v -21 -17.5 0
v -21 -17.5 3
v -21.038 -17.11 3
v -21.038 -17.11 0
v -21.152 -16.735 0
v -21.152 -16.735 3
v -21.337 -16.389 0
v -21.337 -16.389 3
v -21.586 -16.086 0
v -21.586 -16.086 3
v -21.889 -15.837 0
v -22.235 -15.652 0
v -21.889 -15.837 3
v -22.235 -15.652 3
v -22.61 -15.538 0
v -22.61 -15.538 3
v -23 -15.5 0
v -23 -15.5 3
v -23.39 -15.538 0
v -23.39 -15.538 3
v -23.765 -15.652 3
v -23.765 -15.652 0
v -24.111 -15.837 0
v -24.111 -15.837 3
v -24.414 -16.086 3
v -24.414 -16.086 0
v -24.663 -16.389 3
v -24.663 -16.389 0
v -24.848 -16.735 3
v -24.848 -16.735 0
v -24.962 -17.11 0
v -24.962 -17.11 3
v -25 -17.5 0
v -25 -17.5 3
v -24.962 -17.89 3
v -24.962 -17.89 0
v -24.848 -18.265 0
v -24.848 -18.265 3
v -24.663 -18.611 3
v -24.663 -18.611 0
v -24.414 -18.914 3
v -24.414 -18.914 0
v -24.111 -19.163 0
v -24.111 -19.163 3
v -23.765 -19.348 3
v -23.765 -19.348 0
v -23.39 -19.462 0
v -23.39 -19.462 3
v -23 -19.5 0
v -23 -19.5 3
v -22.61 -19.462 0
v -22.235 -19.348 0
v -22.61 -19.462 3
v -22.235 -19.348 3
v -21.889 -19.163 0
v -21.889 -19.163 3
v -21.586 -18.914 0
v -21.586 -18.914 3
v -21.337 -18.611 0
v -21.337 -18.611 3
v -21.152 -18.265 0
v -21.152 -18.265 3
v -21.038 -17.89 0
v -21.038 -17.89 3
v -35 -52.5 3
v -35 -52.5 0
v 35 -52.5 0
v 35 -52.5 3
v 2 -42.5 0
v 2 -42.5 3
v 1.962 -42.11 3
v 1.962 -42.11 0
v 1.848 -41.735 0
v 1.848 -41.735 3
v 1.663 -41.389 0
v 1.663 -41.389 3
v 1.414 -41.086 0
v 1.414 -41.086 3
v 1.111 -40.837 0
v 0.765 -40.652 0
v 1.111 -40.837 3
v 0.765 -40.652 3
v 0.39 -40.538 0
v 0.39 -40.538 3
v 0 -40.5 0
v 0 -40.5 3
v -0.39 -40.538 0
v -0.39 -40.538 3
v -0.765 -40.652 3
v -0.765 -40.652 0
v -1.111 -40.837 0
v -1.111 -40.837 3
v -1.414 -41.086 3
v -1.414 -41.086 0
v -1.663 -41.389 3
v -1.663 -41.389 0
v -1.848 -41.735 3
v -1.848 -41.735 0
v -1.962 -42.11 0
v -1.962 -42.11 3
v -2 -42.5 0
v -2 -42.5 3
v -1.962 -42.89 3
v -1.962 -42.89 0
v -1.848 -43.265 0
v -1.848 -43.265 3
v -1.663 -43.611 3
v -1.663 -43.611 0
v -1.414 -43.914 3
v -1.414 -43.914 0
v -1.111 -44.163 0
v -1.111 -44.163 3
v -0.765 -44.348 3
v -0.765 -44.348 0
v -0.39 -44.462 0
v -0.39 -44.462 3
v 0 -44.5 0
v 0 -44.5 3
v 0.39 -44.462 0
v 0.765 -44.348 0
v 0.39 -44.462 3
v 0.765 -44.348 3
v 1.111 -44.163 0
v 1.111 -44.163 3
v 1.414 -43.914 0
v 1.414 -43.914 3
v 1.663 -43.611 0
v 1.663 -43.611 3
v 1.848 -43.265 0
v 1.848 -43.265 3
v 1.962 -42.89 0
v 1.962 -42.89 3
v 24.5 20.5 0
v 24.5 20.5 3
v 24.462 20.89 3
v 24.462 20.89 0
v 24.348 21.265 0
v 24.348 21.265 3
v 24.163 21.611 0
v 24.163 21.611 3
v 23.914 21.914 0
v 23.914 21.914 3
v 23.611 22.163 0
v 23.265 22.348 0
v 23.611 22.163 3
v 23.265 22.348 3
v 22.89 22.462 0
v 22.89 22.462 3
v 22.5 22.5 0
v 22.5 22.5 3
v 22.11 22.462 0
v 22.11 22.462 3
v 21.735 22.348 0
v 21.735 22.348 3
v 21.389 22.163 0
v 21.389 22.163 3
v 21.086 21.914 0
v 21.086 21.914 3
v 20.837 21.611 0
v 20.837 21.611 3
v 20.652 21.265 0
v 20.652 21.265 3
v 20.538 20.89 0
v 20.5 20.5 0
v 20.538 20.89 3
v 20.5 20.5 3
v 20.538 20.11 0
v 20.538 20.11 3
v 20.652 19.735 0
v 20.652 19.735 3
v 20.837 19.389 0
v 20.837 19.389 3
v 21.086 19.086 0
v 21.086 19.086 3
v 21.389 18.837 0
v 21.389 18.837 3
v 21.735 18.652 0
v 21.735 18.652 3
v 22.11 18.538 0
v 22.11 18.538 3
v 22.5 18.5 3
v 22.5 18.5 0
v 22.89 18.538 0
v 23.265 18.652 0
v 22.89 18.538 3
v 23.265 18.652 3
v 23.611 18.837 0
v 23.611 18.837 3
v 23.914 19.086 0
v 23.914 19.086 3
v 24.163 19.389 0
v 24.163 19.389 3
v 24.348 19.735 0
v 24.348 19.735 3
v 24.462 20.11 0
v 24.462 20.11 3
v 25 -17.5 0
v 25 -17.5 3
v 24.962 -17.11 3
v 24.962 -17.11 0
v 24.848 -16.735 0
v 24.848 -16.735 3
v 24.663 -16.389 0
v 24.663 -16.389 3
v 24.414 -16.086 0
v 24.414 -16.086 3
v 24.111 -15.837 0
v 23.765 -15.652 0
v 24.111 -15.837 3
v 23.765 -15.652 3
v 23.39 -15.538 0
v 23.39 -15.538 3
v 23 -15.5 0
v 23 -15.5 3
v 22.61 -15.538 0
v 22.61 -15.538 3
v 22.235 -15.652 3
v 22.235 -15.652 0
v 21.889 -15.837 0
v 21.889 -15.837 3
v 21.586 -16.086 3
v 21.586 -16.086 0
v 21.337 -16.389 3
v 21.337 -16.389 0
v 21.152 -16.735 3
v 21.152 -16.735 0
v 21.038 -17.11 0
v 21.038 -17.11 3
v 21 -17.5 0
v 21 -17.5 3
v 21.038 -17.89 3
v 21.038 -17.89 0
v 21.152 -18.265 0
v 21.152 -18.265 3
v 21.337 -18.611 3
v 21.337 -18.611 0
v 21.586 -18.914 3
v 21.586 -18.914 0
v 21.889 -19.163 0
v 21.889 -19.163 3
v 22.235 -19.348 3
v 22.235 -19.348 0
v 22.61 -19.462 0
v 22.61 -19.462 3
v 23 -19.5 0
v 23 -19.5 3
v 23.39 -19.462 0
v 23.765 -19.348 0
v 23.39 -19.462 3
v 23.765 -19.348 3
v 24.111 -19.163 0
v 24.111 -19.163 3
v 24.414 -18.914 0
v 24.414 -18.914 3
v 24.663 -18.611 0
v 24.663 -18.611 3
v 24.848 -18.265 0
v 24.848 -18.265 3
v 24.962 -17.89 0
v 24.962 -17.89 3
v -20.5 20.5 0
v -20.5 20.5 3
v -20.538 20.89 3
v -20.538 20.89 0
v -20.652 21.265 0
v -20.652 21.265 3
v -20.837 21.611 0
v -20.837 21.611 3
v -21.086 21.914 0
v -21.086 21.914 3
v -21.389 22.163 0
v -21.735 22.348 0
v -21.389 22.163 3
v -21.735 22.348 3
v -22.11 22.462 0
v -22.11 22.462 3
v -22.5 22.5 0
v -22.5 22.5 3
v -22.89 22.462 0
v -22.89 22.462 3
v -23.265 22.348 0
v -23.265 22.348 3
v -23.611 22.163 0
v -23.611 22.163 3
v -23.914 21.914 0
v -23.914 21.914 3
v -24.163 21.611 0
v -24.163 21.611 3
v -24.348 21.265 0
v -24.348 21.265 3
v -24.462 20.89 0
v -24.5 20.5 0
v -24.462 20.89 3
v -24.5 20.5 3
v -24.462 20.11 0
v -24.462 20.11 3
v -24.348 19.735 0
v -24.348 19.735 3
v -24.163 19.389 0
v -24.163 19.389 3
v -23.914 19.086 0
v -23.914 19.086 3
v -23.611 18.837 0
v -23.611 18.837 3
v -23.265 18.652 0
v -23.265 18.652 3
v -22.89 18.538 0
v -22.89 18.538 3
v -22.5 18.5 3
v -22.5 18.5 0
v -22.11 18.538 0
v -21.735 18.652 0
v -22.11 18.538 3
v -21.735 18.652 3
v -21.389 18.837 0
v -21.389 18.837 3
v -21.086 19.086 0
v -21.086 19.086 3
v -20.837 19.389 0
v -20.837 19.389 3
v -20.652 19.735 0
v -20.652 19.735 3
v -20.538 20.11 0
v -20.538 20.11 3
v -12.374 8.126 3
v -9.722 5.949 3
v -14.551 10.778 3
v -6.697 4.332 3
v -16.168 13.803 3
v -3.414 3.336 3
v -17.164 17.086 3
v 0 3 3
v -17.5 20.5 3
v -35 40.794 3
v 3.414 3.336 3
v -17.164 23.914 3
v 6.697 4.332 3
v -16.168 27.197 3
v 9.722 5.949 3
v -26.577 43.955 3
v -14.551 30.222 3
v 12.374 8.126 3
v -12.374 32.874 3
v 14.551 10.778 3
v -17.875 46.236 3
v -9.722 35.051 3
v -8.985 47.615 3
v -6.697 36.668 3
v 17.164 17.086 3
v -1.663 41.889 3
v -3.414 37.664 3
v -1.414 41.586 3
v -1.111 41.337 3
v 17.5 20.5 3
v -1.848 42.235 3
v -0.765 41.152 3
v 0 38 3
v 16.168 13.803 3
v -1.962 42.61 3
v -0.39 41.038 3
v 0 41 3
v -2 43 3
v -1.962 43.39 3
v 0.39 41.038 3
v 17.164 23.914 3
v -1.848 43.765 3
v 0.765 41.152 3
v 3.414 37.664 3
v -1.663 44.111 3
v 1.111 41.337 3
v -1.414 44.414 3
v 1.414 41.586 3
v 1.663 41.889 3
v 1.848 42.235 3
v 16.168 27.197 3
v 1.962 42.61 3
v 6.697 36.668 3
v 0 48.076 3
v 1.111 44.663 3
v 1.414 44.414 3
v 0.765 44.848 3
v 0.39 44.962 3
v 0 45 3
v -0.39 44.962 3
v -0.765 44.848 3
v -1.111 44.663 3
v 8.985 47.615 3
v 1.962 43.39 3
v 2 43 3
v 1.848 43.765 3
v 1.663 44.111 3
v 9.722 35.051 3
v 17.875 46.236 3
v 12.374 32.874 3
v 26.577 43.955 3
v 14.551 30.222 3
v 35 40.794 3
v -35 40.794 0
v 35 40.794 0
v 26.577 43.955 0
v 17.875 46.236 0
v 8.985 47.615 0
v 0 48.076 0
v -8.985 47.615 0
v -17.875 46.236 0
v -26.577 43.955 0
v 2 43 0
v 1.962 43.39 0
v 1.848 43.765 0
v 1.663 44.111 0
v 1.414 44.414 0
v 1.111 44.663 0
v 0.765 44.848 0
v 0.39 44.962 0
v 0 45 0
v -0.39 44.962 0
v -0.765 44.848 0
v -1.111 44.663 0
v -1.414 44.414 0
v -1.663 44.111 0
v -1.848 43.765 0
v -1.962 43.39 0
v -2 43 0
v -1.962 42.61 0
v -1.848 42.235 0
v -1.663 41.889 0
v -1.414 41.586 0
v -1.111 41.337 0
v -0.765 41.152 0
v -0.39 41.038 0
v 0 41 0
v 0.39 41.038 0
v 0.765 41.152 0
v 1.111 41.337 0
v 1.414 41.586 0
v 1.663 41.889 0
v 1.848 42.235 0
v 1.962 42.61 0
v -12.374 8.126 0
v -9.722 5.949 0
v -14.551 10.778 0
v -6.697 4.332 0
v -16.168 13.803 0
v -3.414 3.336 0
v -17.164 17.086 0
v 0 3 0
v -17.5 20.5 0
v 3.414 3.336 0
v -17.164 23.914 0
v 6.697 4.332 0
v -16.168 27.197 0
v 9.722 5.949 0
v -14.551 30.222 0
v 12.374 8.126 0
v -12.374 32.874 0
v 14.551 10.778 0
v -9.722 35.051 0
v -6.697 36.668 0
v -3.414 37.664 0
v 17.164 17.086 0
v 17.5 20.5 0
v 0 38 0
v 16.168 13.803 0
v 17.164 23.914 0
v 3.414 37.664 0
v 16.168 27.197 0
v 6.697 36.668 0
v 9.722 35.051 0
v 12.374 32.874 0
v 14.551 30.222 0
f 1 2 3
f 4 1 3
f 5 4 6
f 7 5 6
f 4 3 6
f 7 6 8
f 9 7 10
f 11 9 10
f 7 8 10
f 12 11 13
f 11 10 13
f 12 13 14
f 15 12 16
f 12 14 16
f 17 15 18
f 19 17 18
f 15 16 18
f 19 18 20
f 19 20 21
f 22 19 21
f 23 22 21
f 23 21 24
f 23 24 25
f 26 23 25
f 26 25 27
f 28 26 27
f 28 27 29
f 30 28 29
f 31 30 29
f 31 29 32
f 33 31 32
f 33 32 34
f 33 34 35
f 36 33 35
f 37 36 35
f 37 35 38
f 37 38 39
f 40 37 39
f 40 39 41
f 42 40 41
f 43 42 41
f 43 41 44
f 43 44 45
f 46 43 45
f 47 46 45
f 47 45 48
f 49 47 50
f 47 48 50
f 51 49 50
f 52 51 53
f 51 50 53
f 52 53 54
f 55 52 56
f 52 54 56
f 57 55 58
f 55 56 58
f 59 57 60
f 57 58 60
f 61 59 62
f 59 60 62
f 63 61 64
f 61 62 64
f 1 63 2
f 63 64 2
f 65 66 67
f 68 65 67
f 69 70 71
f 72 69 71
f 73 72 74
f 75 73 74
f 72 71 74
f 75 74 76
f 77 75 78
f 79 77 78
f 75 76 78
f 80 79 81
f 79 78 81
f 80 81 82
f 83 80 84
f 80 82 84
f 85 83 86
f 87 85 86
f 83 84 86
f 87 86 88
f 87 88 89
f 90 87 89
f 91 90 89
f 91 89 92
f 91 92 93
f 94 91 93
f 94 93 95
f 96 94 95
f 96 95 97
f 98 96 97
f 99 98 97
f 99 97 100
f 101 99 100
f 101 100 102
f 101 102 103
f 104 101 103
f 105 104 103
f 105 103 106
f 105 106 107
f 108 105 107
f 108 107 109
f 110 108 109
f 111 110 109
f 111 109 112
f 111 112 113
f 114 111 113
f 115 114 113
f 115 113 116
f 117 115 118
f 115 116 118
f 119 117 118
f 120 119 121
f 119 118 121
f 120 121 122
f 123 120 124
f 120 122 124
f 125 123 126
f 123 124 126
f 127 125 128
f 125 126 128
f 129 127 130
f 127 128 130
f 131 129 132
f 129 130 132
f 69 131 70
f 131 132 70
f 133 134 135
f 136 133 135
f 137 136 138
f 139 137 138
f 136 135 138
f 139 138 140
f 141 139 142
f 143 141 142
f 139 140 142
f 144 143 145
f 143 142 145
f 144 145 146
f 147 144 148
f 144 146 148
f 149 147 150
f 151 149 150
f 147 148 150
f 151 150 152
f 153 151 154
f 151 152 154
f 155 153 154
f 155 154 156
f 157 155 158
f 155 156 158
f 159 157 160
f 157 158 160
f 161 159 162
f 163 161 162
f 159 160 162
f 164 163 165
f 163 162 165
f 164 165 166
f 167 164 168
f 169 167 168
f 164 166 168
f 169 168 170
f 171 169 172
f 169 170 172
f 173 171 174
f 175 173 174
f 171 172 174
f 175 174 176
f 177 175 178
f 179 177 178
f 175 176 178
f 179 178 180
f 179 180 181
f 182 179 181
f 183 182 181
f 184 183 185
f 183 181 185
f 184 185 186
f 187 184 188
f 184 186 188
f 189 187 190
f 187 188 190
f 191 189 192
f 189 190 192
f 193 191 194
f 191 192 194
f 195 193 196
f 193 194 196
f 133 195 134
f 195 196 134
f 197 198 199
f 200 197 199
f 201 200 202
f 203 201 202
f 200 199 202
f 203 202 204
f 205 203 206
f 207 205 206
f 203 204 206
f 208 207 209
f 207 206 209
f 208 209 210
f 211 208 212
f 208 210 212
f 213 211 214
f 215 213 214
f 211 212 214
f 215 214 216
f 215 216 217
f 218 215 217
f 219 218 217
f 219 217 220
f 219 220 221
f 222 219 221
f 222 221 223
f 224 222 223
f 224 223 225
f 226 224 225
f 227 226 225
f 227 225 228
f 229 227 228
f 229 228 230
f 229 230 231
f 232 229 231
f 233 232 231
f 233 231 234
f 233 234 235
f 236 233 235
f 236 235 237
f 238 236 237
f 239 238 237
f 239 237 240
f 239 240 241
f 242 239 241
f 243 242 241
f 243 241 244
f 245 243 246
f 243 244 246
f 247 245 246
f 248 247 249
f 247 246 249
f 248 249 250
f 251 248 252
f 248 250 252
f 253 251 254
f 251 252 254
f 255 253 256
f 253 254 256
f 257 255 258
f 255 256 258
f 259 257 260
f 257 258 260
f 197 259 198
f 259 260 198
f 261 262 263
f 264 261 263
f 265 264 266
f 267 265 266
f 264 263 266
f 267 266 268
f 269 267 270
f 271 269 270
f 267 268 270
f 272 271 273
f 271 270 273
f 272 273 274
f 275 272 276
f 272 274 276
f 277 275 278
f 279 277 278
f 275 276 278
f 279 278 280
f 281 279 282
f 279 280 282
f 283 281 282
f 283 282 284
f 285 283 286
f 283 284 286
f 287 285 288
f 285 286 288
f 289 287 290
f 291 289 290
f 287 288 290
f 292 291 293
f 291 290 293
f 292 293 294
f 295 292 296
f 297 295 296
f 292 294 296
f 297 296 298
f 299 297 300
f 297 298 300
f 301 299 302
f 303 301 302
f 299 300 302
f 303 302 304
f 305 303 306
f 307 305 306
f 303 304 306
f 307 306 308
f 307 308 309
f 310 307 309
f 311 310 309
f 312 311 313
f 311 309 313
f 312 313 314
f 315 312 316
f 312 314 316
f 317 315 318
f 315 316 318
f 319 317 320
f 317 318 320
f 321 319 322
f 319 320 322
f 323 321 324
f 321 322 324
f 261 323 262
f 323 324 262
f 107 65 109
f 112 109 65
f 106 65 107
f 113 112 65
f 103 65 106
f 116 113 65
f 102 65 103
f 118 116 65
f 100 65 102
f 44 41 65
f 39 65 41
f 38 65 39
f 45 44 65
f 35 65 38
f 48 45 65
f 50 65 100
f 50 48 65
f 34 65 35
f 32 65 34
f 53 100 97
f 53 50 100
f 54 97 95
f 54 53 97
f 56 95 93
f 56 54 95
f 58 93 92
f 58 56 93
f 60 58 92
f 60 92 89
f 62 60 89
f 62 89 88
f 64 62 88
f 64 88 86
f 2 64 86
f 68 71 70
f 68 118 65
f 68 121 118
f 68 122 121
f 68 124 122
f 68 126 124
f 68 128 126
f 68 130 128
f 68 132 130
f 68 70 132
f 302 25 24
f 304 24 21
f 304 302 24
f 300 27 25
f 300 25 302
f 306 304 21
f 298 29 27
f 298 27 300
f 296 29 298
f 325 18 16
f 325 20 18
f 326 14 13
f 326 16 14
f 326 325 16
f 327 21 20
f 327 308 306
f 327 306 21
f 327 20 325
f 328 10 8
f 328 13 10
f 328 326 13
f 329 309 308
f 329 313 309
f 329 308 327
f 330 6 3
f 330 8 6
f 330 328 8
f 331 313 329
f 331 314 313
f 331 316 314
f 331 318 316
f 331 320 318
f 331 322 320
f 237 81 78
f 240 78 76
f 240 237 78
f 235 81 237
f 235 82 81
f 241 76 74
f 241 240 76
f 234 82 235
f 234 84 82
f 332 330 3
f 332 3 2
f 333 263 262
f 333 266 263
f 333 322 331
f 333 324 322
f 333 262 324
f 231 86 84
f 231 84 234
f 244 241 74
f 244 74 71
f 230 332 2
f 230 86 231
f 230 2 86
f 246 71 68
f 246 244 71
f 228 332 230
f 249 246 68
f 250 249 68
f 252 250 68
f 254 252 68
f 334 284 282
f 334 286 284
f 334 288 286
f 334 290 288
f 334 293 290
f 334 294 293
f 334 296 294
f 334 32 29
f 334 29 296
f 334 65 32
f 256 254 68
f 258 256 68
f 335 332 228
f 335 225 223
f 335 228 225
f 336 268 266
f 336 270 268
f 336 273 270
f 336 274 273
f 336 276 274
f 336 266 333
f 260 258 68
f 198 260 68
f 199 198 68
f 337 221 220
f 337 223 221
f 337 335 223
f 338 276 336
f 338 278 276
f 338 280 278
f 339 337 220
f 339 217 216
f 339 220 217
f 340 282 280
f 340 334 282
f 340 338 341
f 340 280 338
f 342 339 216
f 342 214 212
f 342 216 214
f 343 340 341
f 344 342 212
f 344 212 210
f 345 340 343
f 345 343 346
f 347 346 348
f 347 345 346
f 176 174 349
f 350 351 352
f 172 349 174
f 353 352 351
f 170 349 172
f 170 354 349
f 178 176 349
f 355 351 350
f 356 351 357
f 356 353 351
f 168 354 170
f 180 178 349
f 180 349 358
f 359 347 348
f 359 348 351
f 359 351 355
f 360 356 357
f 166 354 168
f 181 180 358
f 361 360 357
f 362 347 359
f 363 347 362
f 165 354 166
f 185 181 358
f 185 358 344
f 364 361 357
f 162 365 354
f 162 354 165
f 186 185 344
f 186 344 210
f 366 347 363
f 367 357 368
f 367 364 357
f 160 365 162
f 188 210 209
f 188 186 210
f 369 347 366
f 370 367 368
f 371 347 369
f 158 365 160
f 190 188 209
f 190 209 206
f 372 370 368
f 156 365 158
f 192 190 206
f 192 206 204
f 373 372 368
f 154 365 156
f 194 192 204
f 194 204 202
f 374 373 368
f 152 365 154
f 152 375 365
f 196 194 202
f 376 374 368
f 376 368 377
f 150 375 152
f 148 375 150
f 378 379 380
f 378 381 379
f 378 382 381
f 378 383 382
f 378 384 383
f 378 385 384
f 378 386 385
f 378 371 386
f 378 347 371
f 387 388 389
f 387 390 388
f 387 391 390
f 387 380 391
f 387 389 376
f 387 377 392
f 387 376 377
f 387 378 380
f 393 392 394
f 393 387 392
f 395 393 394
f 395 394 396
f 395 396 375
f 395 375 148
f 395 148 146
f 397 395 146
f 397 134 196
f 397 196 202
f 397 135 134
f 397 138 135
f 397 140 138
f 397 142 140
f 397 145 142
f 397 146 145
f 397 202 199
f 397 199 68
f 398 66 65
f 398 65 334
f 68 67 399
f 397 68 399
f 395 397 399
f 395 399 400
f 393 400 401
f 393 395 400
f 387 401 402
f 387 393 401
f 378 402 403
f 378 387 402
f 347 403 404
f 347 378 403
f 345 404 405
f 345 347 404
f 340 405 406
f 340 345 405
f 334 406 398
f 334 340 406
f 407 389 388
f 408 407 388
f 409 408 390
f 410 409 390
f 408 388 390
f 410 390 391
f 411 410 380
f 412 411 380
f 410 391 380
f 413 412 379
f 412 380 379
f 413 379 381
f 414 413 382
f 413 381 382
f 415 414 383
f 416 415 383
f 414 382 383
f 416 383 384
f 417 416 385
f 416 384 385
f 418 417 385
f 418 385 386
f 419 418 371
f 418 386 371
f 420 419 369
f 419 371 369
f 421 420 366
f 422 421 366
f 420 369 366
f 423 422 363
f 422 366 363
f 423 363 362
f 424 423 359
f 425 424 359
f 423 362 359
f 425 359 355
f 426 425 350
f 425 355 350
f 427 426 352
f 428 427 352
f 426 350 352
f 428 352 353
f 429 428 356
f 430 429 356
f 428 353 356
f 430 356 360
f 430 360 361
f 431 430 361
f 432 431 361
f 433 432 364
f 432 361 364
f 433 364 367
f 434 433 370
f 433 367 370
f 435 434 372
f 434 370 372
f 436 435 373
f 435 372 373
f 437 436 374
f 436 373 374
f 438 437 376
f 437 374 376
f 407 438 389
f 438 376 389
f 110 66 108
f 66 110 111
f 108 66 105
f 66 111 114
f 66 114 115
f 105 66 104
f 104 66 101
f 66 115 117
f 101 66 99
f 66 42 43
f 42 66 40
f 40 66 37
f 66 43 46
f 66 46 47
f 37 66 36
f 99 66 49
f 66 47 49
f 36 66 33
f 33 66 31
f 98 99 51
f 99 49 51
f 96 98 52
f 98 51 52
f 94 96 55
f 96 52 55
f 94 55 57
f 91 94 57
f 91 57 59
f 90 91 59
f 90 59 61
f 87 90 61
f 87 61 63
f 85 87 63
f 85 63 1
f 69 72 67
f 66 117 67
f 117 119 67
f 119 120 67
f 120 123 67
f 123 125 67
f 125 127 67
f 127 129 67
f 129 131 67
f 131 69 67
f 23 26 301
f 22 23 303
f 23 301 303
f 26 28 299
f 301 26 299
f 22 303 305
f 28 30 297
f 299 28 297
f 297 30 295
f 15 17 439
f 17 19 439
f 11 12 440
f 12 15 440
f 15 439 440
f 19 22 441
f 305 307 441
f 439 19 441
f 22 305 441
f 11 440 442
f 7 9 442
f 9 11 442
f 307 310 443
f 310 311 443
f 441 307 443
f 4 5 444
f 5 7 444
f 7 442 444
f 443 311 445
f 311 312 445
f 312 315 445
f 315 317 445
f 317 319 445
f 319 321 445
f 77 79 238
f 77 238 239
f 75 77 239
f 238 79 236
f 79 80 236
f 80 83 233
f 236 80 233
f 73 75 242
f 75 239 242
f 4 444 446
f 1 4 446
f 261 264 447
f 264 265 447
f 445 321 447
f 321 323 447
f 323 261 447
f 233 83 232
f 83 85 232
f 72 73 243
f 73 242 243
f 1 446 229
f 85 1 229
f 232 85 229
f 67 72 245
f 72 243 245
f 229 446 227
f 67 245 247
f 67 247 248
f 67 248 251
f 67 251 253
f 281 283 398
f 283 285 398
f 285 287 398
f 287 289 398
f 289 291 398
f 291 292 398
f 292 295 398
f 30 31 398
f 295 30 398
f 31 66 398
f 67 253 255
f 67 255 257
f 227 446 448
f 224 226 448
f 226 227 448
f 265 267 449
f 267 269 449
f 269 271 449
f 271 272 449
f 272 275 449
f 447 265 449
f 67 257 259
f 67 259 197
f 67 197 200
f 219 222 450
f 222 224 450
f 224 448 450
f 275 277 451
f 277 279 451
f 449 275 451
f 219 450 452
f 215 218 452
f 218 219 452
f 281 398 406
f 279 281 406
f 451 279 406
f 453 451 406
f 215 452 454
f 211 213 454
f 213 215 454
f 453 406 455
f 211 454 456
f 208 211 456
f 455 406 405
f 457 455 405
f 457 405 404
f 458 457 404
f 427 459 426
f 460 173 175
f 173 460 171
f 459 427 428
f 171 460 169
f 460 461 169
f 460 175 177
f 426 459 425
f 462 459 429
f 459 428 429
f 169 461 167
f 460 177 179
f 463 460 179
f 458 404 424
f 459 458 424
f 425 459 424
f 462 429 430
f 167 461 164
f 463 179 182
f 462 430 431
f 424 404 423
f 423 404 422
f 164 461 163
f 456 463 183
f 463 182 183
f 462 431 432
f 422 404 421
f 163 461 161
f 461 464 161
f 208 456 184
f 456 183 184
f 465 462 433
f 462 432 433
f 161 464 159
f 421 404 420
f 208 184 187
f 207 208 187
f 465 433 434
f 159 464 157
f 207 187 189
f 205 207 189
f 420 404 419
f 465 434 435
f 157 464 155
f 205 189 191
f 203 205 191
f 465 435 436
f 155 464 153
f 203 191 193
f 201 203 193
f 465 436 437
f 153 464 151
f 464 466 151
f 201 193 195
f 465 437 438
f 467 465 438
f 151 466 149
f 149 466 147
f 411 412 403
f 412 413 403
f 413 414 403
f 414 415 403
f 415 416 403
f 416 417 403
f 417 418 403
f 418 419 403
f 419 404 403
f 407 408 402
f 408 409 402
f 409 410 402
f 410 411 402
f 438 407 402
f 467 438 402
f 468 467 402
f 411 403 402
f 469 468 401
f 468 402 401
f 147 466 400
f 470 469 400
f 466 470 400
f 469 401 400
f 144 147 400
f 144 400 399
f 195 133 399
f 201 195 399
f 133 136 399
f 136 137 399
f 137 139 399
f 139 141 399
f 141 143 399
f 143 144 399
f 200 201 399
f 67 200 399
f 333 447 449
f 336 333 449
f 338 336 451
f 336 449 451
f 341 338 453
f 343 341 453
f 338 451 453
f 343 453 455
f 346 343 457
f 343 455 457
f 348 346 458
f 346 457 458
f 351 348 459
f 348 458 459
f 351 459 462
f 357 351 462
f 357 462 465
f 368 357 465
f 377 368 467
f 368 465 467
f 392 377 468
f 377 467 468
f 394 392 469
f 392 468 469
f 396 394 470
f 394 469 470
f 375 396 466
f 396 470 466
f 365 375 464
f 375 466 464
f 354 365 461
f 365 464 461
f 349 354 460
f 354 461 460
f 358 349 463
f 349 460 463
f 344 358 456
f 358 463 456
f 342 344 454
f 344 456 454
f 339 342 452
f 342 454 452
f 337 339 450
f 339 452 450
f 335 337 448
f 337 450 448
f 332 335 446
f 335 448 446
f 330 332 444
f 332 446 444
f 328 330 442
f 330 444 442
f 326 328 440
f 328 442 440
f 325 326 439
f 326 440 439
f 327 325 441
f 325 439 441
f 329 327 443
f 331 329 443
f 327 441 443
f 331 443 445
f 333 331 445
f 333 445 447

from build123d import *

# Parameters (mm, degrees)
SKETCH1_W           = 70
SKETCH1_H           = 105
BOSS_EXTRUDE1_DEPTH = 3
SKETCH2_R           = 17.5
CUT_EXTRUDE3_DEPTH  = 3
SKETCH3_R           = 2
CUT_EXTRUDE4_DEPTH  = 3
SKETCH4_R           = 2
CUT_EXTRUDE5_DEPTH  = 5
CUT_EXTRUDE6_DEPTH  = 10


with BuildPart() as part:
    # Sketch1 → Boss-Extrude1 (new body)
    with BuildSketch(Plane.XY):
        Rectangle(SKETCH1_W, SKETCH1_H)
    extrude(amount=BOSS_EXTRUDE1_DEPTH)

    # Sketch2 → Cut-Extrude3 (cut)
    with BuildSketch(Plane(origin=(0, 0, 0), x_dir=(-1, 0, 0), z_dir=(0, 0, -1))):
        with Locations((0, 20.5)):
            Circle(SKETCH2_R)
    extrude(amount=-CUT_EXTRUDE3_DEPTH, mode=Mode.SUBTRACT)

    # Sketch3 → Cut-Extrude4 (cut)
    with BuildSketch(Plane.XY.offset(3)):
        with Locations((-22.5, 20.5)):
            Circle(SKETCH3_R)
        with Locations((0, 43)):
            Circle(SKETCH3_R)
        with Locations((22.5, 20.5)):
            Circle(SKETCH3_R)
    extrude(amount=-CUT_EXTRUDE4_DEPTH, mode=Mode.SUBTRACT)

    # Sketch4 → Cut-Extrude5 (cut)
    with BuildSketch(Plane.XY.offset(3)):
        with Locations((0, -42.5)):
            Circle(SKETCH4_R)
        with Locations((-23, -17.5)):
            Circle(SKETCH4_R)
        with Locations((23, -17.5)):
            Circle(SKETCH4_R)
    extrude(amount=-CUT_EXTRUDE5_DEPTH, mode=Mode.SUBTRACT)

    # Sketch5 → Cut-Extrude6 (cut)
    with BuildSketch(Plane.XY.offset(3)):
        with BuildLine():
            Line((-35, 40.793543502), (-35, 52.5))
            Line((-35, 52.5), (35, 52.5))
            Line((35, 52.5), (35, 40.793543502))
            ThreePointArc((35, 40.793543502), (0, 48.07644174), (-35, 40.793543502))
        make_face()
    extrude(amount=-CUT_EXTRUDE6_DEPTH, mode=Mode.SUBTRACT)


solid = part.part
